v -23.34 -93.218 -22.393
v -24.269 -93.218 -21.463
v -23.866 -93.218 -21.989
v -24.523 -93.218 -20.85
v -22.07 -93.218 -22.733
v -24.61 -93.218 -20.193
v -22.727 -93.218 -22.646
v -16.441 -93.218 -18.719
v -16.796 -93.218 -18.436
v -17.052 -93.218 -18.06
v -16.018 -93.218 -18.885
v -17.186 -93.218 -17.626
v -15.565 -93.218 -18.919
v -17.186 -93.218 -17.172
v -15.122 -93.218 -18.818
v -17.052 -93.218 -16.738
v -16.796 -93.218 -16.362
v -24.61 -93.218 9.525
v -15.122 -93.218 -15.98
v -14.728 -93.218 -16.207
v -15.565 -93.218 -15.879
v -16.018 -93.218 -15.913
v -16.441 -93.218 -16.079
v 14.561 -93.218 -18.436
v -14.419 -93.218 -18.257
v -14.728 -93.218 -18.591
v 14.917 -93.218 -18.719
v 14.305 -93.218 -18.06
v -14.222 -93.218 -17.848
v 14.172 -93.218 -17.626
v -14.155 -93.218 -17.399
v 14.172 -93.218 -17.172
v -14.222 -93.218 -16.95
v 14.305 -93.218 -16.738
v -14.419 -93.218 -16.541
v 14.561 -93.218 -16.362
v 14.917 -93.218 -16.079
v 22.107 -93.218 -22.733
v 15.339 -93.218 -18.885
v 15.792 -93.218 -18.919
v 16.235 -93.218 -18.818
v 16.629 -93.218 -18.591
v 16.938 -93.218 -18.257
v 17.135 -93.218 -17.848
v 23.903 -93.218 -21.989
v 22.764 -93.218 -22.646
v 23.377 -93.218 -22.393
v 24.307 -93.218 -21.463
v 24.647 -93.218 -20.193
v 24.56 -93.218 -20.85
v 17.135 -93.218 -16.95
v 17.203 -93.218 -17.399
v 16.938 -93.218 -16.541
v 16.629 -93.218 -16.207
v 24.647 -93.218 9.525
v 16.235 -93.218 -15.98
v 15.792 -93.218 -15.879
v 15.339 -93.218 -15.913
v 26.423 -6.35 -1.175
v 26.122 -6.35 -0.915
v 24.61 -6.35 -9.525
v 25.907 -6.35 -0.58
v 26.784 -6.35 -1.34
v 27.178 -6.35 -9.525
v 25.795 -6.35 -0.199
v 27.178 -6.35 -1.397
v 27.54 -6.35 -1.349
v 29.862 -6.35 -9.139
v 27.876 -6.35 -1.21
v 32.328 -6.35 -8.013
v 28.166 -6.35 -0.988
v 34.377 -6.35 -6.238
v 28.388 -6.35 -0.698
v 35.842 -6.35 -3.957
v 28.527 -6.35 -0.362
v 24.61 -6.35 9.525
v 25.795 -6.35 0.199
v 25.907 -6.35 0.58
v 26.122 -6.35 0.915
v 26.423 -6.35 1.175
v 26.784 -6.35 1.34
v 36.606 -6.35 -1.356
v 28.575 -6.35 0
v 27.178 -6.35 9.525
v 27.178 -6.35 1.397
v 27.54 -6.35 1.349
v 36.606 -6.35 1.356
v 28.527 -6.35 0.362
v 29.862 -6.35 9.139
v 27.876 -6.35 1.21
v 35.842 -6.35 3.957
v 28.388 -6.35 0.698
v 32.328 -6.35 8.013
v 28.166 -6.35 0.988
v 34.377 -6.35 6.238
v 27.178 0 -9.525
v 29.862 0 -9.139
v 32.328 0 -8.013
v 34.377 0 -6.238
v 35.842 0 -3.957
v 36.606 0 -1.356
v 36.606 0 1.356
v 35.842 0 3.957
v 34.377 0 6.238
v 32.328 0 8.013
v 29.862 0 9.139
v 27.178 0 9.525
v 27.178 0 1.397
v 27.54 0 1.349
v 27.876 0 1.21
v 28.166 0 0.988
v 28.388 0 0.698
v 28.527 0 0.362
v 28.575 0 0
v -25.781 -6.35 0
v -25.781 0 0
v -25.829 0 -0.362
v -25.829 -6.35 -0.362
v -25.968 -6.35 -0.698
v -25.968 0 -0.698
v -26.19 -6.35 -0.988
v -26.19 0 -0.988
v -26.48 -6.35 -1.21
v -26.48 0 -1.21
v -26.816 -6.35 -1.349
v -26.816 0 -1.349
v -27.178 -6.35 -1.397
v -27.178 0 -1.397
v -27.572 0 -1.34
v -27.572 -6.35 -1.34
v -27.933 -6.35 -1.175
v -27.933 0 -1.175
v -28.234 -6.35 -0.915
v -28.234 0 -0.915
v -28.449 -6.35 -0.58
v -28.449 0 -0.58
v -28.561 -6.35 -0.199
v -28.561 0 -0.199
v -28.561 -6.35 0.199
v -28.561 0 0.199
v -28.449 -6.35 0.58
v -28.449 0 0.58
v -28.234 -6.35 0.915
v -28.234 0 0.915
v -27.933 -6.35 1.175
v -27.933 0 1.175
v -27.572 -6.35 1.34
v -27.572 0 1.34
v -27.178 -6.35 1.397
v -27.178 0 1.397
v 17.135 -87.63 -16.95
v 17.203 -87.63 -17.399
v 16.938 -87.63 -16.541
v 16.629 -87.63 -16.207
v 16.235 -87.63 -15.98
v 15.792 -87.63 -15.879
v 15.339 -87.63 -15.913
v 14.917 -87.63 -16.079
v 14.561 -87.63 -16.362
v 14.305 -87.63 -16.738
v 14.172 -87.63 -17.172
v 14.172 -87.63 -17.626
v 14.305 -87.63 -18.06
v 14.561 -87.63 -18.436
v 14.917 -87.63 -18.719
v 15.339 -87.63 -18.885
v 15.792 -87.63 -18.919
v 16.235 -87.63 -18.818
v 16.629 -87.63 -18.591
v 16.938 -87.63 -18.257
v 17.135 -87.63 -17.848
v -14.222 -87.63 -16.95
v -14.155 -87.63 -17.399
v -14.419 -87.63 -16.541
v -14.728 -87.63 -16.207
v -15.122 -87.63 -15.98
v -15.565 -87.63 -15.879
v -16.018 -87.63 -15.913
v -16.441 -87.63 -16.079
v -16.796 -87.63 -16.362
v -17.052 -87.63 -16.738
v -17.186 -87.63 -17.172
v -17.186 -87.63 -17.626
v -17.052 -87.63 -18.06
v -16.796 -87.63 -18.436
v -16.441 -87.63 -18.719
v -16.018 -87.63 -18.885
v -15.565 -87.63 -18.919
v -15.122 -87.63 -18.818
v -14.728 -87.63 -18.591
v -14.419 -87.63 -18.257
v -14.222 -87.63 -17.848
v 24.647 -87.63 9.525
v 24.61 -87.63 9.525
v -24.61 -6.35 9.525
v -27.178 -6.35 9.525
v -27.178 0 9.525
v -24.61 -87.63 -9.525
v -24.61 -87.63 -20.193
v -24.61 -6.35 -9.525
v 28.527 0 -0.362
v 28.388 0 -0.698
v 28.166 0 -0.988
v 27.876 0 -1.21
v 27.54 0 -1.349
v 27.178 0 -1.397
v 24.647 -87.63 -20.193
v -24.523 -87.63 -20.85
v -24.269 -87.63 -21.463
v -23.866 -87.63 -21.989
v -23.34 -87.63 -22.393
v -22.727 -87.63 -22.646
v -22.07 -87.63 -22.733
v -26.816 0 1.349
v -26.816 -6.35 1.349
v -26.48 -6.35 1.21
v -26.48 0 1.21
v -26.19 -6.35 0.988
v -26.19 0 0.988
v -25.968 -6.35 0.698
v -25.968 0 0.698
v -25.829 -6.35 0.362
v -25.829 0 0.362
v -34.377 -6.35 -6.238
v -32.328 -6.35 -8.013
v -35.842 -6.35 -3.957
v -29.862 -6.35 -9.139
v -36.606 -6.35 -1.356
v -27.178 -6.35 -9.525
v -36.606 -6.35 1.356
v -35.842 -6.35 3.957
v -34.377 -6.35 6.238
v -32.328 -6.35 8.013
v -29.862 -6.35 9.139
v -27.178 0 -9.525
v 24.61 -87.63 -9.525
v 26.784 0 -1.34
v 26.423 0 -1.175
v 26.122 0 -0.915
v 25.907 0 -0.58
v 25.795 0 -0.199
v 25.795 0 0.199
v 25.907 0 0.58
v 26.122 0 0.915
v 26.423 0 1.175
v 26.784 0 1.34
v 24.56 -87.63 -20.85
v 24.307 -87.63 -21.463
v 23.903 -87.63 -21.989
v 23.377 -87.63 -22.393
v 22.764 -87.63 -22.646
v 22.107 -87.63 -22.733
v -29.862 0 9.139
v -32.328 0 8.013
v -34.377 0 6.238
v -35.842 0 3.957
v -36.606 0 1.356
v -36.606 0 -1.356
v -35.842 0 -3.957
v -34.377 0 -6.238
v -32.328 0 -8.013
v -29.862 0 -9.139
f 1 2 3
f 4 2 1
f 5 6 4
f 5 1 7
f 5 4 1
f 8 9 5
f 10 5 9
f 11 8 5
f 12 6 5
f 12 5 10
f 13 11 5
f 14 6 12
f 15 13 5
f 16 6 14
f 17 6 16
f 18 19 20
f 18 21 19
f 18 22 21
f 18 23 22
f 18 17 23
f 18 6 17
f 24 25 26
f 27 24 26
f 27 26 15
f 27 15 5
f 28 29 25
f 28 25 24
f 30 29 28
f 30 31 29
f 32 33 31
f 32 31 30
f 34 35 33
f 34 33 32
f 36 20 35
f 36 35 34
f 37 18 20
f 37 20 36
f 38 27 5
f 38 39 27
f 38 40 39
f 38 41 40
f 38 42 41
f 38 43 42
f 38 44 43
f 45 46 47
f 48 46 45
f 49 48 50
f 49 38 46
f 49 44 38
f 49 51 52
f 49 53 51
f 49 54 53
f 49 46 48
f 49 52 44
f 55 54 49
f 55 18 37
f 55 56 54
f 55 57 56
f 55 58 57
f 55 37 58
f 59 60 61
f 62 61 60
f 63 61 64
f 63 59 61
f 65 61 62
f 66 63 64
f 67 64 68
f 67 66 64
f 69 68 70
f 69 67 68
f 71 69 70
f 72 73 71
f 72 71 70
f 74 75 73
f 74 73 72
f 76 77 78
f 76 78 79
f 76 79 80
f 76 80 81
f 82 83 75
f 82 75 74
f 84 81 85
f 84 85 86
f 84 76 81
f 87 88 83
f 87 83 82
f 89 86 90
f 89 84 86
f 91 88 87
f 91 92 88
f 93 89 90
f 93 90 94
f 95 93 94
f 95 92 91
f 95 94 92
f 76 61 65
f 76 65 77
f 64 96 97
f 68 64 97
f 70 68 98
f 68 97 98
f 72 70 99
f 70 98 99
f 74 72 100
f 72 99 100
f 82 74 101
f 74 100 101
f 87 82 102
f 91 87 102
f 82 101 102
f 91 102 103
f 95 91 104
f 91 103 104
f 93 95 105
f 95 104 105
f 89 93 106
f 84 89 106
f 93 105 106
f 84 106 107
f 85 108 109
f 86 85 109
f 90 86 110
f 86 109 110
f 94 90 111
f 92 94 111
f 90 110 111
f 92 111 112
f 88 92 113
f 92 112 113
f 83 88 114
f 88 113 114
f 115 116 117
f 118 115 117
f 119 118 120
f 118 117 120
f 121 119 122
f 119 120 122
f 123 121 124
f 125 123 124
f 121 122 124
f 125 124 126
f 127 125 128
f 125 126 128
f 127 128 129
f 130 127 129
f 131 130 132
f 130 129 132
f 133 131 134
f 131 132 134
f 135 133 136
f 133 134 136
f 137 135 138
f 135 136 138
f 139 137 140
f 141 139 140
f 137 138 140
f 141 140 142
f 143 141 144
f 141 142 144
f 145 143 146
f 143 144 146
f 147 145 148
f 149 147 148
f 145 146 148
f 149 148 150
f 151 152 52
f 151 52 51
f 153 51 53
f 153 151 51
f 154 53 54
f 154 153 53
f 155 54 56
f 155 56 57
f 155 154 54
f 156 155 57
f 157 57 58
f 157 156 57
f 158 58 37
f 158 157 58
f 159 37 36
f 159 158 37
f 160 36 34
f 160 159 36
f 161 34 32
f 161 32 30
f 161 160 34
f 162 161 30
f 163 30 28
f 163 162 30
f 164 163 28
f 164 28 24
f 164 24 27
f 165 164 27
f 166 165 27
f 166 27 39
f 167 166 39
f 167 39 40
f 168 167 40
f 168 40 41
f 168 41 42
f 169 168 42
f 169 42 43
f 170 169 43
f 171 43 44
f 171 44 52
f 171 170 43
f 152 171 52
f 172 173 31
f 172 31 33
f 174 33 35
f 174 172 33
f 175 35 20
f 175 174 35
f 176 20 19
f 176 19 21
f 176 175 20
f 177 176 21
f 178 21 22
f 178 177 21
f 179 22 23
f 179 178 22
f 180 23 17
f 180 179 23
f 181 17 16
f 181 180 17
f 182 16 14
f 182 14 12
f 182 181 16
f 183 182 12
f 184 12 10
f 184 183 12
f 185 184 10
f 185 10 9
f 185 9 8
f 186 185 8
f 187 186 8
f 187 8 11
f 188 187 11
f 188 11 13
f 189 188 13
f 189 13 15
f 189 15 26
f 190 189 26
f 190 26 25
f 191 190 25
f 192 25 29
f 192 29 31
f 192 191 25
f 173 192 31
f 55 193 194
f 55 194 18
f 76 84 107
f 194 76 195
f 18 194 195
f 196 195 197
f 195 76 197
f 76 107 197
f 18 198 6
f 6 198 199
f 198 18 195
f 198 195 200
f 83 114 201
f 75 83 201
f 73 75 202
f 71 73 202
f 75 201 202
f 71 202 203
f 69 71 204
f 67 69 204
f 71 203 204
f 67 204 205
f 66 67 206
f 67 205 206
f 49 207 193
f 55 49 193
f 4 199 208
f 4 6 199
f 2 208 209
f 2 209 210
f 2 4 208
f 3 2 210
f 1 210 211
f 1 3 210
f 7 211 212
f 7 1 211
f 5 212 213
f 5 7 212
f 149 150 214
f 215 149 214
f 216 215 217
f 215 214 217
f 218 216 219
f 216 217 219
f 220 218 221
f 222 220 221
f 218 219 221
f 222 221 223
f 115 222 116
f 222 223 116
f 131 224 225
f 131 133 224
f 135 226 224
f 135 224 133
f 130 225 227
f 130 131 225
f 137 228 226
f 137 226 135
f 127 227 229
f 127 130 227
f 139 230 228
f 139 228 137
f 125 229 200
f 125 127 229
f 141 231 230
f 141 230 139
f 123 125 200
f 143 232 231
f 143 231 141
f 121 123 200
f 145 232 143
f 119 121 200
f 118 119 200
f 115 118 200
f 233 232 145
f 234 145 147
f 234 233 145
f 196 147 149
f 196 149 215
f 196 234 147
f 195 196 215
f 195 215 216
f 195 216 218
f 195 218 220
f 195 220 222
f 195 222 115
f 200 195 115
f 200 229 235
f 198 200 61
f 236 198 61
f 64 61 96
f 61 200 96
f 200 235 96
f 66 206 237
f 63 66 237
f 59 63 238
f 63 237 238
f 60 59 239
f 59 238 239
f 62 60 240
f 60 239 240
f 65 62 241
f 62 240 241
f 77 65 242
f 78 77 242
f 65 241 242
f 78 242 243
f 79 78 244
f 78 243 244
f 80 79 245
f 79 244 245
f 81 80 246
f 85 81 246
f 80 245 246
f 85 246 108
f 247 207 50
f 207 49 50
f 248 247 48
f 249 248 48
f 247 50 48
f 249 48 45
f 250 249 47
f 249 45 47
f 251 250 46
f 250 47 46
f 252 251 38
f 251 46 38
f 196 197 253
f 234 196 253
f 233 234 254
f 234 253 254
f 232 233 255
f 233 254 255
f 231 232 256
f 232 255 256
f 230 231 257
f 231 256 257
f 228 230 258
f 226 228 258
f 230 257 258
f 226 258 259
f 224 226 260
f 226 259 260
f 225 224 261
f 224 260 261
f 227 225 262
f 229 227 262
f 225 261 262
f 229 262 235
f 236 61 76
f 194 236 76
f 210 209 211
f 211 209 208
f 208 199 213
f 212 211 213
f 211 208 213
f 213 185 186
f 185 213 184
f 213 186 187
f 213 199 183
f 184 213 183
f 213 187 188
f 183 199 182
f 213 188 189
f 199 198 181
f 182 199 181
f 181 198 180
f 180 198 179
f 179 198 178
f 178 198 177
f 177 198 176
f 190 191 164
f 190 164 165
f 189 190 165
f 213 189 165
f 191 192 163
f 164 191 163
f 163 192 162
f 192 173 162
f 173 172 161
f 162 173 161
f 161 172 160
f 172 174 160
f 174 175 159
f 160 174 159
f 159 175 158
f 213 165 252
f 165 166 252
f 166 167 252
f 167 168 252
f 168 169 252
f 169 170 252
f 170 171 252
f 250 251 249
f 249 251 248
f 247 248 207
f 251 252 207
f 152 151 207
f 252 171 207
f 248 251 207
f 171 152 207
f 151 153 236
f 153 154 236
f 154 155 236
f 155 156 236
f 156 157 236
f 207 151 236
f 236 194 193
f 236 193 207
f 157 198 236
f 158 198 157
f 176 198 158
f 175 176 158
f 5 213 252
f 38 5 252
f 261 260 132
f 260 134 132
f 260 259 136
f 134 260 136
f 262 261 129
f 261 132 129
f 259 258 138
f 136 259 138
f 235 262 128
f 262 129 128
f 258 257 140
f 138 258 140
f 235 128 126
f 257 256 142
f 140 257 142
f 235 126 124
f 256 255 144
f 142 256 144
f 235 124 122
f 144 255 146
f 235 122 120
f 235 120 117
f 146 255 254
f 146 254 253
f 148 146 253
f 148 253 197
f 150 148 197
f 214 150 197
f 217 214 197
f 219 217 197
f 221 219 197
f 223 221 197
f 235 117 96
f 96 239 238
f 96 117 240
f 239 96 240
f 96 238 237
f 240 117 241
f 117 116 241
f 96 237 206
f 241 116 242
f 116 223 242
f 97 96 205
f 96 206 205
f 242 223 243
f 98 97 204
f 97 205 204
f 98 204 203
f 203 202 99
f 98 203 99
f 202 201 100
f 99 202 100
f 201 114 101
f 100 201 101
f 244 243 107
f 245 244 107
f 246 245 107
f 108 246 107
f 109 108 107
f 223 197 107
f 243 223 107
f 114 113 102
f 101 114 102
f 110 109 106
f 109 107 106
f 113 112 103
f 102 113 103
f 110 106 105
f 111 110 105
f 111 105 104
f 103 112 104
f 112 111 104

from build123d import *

# Parameters (mm, degrees)
F1_DEPTH = 6.35
F2_W     = 49.21945557
F2_H     = 19.05
F3_DEPTH = 81.28
F4_W     = 49.21945557
F4_H     = 19.05
F4_R     = 1.524
F5_DEPTH = 5.588
F6_R     = 2.54


with BuildPart() as f1:
    # F0 (on Front) → F1 (new body)
    with BuildSketch(Plane.XZ):
        with BuildLine():
            ThreePointArc((-27.178, 9.525), (-36.703, 0), (-27.178, -9.525))
            Line((-27.178, -9.525), (-27.178, -1.397))
            ThreePointArc((-27.178, -1.397), (-28.575, 0), (-27.178, 1.397))
            Line((-27.178, 1.397), (-27.178, 9.525))
        make_face()
        with BuildLine():
            Line((-27.178, -9.525), (27.178, -9.525))
            Line((27.178, -9.525), (27.178, -1.397))
            ThreePointArc((27.178, -1.397), (25.781, 0), (27.178, 1.397))
            Line((27.178, 1.397), (27.178, 9.525))
            Line((27.178, 9.525), (-27.178, 9.525))
            Line((-27.178, 9.525), (-27.178, 1.397))
            ThreePointArc((-27.178, 1.397), (-26.1901718267, 0.9878281733), (-25.781, 0))
            ThreePointArc((-25.781, 0), (-26.1901718267, -0.9878281733), (-27.178, -1.397))
            Line((-27.178, -1.397), (-27.178, -9.525))
        make_face()
        with BuildLine():
            Line((27.178, -1.397), (27.178, -9.525))
            ThreePointArc((27.178, -9.525), (36.703, 0), (27.178, 9.525))
            Line((27.178, 9.525), (27.178, 1.397))
            ThreePointArc((27.178, 1.397), (28.1658281733, 0.9878281733), (28.575, 0))
            ThreePointArc((28.575, 0), (28.1658281733, -0.9878281733), (27.178, -1.397))
        make_face()
    extrude(amount=F1_DEPTH)

    # F2 (on face) → F3 (join)
    with BuildSketch(Plane.XZ.offset(6.35)):
        Rectangle(F2_W, F2_H)
    extrude(amount=F3_DEPTH)

    # F4 (on face) → F5 (join)
    with BuildSketch(Plane.XZ.offset(87.63)):
        Rectangle(F4_W, F4_H)
        Polygon((24.6470458806, 9.525), (24.609727785, 9.525), (24.609727785, -9.525), (-24.609727785, -9.525), (-24.609727785, -22.733), (24.6470458806, -22.733), align=None)
        with Locations((-15.678541685, -17.399)):
            Circle(F4_R, mode=Mode.SUBTRACT)
        with Locations((15.678541685, -17.399)):
            Circle(F4_R, mode=Mode.SUBTRACT)
    extrude(amount=F5_DEPTH)

    # F6
    f6_edges = [f1.edges().sort_by_distance(p)[0] for p in [
        (-24.609728, -90.424, -22.733),
        (24.647046, -90.424, -22.733),
    ]]
    fillet(f6_edges, radius=F6_R)


solid = f1.part
